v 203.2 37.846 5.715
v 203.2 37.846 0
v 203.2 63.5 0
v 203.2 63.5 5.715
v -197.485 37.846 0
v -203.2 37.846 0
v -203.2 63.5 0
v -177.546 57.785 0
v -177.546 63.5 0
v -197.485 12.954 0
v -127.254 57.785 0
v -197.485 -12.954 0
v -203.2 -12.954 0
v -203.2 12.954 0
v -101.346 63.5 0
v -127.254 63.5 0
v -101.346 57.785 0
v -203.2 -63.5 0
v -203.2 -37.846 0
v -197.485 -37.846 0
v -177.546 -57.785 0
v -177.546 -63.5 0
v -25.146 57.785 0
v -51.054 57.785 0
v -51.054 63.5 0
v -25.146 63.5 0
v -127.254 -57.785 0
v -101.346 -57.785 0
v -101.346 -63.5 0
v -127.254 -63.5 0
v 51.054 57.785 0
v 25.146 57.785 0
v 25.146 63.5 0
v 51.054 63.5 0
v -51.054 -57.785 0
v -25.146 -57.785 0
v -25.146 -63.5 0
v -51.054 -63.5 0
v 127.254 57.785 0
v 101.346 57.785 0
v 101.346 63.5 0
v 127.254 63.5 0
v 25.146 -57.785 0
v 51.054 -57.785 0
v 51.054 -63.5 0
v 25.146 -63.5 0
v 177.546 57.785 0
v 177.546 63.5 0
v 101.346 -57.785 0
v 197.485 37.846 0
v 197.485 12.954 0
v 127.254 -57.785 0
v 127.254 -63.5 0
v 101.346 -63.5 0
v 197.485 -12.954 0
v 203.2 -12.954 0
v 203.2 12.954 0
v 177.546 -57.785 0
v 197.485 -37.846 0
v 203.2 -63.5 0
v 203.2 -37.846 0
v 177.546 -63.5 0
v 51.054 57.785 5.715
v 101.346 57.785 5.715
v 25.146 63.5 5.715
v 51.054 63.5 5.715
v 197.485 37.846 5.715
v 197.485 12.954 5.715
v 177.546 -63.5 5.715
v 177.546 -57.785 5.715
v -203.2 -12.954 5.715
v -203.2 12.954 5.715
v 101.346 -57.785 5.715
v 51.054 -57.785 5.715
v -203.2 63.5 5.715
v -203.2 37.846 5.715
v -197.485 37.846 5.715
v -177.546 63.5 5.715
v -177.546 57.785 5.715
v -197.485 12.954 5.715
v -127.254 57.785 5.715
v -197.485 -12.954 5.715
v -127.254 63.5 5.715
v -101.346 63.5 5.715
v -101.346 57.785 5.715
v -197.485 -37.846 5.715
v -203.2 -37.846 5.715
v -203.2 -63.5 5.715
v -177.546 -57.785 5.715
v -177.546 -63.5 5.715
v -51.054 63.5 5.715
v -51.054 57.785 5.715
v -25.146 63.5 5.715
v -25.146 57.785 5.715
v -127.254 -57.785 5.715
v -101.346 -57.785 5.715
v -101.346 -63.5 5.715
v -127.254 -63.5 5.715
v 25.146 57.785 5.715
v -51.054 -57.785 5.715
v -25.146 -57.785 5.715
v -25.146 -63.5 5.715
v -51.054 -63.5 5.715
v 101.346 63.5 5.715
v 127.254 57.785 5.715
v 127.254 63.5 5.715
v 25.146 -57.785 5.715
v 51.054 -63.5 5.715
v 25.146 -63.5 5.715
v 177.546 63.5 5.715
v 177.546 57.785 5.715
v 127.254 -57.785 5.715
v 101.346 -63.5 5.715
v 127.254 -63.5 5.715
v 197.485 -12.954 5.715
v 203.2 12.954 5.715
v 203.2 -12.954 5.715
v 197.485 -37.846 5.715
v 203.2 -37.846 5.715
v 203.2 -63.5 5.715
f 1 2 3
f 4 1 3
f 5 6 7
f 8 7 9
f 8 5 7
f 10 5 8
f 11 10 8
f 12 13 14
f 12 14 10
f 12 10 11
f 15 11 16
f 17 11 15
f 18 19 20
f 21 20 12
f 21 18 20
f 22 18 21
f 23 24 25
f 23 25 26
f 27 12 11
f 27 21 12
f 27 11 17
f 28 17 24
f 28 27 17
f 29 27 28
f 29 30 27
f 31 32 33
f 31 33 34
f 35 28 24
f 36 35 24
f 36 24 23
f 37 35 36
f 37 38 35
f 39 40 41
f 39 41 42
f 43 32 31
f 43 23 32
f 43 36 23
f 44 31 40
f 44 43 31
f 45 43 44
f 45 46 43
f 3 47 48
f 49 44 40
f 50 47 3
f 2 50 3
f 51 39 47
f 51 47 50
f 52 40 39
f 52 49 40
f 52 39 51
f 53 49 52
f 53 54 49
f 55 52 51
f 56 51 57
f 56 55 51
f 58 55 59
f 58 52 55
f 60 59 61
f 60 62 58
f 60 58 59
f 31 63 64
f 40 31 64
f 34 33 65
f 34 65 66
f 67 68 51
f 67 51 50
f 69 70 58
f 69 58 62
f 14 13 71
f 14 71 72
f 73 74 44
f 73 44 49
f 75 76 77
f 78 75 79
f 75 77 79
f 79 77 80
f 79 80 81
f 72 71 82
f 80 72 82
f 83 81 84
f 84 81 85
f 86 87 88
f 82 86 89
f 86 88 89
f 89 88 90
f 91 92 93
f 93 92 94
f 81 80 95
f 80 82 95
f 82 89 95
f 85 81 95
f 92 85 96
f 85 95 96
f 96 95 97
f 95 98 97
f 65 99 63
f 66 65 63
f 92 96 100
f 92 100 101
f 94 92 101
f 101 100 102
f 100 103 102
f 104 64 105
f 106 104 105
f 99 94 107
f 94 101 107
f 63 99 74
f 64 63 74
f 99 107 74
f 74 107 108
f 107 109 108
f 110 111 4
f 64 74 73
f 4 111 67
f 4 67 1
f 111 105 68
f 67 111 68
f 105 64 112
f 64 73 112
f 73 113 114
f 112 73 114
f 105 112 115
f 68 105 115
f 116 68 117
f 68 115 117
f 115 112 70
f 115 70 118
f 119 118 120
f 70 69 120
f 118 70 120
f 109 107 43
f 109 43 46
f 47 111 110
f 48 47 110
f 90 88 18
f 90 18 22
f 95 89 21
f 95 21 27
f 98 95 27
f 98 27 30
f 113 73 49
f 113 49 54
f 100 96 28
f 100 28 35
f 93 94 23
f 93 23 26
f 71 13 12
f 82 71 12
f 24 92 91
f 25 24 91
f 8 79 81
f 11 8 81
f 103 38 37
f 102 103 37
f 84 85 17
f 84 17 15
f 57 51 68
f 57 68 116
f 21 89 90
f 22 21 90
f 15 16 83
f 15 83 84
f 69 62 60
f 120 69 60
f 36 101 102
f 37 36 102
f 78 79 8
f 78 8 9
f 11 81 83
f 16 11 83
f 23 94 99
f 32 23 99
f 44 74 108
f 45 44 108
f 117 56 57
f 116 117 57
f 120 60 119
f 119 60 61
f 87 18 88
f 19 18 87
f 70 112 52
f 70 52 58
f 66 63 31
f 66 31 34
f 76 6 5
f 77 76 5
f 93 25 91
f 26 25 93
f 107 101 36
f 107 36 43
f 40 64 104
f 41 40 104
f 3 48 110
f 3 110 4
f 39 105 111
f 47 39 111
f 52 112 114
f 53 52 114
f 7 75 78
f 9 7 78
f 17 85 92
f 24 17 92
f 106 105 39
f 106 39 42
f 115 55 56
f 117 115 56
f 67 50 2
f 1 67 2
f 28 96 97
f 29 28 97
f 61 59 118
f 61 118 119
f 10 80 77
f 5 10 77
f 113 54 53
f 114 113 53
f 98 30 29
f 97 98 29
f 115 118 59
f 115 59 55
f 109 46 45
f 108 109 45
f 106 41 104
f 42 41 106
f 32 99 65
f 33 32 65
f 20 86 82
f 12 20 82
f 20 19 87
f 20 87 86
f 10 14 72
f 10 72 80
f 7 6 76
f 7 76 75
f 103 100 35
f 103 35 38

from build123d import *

# Parameters (mm, degrees)
SKETCH1_W           = 406.4
SKETCH1_H           = 127
BOSS_EXTRUDE1_DEPTH = 5.715
SKETCH2_W           = 50.8
SKETCH2_H           = 5.715
TOP_JIGSAW_DEPTH    = 6.715
SKETCH3_W           = 5.715
SKETCH3_H           = 25.4
RIGHT_JIGSAW_DEPTH  = 6.715
SKETCH4_W           = 0.254
SKETCH4_H           = 5.715
SKETCH4_W_2         = 5.715
SKETCH4_H_2         = 0.254
BOSS_EXTRUDE2_DEPTH = 5.715


with BuildPart() as part:
    # Sketch1 → Boss-Extrude1 (new body)
    with BuildSketch(Plane.XY):
        Rectangle(SKETCH1_W, SKETCH1_H)
    extrude(amount=BOSS_EXTRUDE1_DEPTH)

    # Sketch2 → Top Jigsaw (cut, through all)
    with BuildSketch(Plane.XY.offset(5.715)):
        with Locations((-152.4, 60.6425)):
            Rectangle(SKETCH2_W, SKETCH2_H)
        with Locations((-76.2, 60.6425)):
            Rectangle(SKETCH2_W, SKETCH2_H)
        with Locations((0, 60.6425)):
            Rectangle(SKETCH2_W, SKETCH2_H)
        with Locations((76.2, 60.6425)):
            Rectangle(SKETCH2_W, SKETCH2_H)
        with Locations((152.4, 60.6425)):
            Rectangle(SKETCH2_W, SKETCH2_H)
    top_jigsaw = extrude(amount=-TOP_JIGSAW_DEPTH, mode=Mode.SUBTRACT)

    # Bottom Jigsaw: Top Jigsaw across plane
    add(top_jigsaw.mirror(Plane.ZX), mode=Mode.SUBTRACT)

    # Sketch3 → Right Jigsaw (cut, through all)
    with BuildSketch(Plane.XY.offset(5.715)):
        with Locations((200.3425, 25.4)):
            Rectangle(SKETCH3_W, SKETCH3_H)
        with Locations((200.3425, -25.4)):
            Rectangle(SKETCH3_W, SKETCH3_H)
    right_jigsaw = extrude(amount=-RIGHT_JIGSAW_DEPTH, mode=Mode.SUBTRACT)

    # Mirror2: Right Jigsaw across plane
    add(right_jigsaw.mirror(Plane(origin=(0, 0, 0), x_dir=(0, 0, 1), z_dir=(1, 0, 0))), mode=Mode.SUBTRACT)

    # Sketch4 → Boss-Extrude2 (add)
    with BuildSketch(Plane.XY.offset(5.715)):
        with Locations((-177.673, 60.6425)):
            Rectangle(SKETCH4_W, SKETCH4_H)
        with Locations((-127.127, 60.6425)):
            Rectangle(SKETCH4_W, SKETCH4_H)
        with Locations((-101.473, 60.6425)):
            Rectangle(SKETCH4_W, SKETCH4_H)
        with Locations((-50.927, 60.6425)):
            Rectangle(SKETCH4_W, SKETCH4_H)
        with Locations((-25.273, 60.6425)):
            Rectangle(SKETCH4_W, SKETCH4_H)
        with Locations((25.273, 60.6425)):
            Rectangle(SKETCH4_W, SKETCH4_H)
        with Locations((50.927, 60.6425)):
            Rectangle(SKETCH4_W, SKETCH4_H)
        with Locations((101.473, 60.6425)):
            Rectangle(SKETCH4_W, SKETCH4_H)
        with Locations((127.127, 60.6425)):
            Rectangle(SKETCH4_W, SKETCH4_H)
        with Locations((177.673, 60.6425)):
            Rectangle(SKETCH4_W, SKETCH4_H)
        with Locations((200.3425, 37.973)):
            Rectangle(SKETCH4_W_2, SKETCH4_H_2)
        with Locations((200.3425, 12.827)):
            Rectangle(SKETCH4_W_2, SKETCH4_H_2)
        with Locations((-200.3425, 37.973)):
            Rectangle(SKETCH4_W_2, SKETCH4_H_2)
        with Locations((-200.3425, 12.827)):
            Rectangle(SKETCH4_W_2, SKETCH4_H_2)
    boss_extrude2 = extrude(amount=-BOSS_EXTRUDE2_DEPTH)

    # Mirror3: Boss-Extrude2 across plane
    add(boss_extrude2.mirror(Plane.ZX))


solid = part.part
